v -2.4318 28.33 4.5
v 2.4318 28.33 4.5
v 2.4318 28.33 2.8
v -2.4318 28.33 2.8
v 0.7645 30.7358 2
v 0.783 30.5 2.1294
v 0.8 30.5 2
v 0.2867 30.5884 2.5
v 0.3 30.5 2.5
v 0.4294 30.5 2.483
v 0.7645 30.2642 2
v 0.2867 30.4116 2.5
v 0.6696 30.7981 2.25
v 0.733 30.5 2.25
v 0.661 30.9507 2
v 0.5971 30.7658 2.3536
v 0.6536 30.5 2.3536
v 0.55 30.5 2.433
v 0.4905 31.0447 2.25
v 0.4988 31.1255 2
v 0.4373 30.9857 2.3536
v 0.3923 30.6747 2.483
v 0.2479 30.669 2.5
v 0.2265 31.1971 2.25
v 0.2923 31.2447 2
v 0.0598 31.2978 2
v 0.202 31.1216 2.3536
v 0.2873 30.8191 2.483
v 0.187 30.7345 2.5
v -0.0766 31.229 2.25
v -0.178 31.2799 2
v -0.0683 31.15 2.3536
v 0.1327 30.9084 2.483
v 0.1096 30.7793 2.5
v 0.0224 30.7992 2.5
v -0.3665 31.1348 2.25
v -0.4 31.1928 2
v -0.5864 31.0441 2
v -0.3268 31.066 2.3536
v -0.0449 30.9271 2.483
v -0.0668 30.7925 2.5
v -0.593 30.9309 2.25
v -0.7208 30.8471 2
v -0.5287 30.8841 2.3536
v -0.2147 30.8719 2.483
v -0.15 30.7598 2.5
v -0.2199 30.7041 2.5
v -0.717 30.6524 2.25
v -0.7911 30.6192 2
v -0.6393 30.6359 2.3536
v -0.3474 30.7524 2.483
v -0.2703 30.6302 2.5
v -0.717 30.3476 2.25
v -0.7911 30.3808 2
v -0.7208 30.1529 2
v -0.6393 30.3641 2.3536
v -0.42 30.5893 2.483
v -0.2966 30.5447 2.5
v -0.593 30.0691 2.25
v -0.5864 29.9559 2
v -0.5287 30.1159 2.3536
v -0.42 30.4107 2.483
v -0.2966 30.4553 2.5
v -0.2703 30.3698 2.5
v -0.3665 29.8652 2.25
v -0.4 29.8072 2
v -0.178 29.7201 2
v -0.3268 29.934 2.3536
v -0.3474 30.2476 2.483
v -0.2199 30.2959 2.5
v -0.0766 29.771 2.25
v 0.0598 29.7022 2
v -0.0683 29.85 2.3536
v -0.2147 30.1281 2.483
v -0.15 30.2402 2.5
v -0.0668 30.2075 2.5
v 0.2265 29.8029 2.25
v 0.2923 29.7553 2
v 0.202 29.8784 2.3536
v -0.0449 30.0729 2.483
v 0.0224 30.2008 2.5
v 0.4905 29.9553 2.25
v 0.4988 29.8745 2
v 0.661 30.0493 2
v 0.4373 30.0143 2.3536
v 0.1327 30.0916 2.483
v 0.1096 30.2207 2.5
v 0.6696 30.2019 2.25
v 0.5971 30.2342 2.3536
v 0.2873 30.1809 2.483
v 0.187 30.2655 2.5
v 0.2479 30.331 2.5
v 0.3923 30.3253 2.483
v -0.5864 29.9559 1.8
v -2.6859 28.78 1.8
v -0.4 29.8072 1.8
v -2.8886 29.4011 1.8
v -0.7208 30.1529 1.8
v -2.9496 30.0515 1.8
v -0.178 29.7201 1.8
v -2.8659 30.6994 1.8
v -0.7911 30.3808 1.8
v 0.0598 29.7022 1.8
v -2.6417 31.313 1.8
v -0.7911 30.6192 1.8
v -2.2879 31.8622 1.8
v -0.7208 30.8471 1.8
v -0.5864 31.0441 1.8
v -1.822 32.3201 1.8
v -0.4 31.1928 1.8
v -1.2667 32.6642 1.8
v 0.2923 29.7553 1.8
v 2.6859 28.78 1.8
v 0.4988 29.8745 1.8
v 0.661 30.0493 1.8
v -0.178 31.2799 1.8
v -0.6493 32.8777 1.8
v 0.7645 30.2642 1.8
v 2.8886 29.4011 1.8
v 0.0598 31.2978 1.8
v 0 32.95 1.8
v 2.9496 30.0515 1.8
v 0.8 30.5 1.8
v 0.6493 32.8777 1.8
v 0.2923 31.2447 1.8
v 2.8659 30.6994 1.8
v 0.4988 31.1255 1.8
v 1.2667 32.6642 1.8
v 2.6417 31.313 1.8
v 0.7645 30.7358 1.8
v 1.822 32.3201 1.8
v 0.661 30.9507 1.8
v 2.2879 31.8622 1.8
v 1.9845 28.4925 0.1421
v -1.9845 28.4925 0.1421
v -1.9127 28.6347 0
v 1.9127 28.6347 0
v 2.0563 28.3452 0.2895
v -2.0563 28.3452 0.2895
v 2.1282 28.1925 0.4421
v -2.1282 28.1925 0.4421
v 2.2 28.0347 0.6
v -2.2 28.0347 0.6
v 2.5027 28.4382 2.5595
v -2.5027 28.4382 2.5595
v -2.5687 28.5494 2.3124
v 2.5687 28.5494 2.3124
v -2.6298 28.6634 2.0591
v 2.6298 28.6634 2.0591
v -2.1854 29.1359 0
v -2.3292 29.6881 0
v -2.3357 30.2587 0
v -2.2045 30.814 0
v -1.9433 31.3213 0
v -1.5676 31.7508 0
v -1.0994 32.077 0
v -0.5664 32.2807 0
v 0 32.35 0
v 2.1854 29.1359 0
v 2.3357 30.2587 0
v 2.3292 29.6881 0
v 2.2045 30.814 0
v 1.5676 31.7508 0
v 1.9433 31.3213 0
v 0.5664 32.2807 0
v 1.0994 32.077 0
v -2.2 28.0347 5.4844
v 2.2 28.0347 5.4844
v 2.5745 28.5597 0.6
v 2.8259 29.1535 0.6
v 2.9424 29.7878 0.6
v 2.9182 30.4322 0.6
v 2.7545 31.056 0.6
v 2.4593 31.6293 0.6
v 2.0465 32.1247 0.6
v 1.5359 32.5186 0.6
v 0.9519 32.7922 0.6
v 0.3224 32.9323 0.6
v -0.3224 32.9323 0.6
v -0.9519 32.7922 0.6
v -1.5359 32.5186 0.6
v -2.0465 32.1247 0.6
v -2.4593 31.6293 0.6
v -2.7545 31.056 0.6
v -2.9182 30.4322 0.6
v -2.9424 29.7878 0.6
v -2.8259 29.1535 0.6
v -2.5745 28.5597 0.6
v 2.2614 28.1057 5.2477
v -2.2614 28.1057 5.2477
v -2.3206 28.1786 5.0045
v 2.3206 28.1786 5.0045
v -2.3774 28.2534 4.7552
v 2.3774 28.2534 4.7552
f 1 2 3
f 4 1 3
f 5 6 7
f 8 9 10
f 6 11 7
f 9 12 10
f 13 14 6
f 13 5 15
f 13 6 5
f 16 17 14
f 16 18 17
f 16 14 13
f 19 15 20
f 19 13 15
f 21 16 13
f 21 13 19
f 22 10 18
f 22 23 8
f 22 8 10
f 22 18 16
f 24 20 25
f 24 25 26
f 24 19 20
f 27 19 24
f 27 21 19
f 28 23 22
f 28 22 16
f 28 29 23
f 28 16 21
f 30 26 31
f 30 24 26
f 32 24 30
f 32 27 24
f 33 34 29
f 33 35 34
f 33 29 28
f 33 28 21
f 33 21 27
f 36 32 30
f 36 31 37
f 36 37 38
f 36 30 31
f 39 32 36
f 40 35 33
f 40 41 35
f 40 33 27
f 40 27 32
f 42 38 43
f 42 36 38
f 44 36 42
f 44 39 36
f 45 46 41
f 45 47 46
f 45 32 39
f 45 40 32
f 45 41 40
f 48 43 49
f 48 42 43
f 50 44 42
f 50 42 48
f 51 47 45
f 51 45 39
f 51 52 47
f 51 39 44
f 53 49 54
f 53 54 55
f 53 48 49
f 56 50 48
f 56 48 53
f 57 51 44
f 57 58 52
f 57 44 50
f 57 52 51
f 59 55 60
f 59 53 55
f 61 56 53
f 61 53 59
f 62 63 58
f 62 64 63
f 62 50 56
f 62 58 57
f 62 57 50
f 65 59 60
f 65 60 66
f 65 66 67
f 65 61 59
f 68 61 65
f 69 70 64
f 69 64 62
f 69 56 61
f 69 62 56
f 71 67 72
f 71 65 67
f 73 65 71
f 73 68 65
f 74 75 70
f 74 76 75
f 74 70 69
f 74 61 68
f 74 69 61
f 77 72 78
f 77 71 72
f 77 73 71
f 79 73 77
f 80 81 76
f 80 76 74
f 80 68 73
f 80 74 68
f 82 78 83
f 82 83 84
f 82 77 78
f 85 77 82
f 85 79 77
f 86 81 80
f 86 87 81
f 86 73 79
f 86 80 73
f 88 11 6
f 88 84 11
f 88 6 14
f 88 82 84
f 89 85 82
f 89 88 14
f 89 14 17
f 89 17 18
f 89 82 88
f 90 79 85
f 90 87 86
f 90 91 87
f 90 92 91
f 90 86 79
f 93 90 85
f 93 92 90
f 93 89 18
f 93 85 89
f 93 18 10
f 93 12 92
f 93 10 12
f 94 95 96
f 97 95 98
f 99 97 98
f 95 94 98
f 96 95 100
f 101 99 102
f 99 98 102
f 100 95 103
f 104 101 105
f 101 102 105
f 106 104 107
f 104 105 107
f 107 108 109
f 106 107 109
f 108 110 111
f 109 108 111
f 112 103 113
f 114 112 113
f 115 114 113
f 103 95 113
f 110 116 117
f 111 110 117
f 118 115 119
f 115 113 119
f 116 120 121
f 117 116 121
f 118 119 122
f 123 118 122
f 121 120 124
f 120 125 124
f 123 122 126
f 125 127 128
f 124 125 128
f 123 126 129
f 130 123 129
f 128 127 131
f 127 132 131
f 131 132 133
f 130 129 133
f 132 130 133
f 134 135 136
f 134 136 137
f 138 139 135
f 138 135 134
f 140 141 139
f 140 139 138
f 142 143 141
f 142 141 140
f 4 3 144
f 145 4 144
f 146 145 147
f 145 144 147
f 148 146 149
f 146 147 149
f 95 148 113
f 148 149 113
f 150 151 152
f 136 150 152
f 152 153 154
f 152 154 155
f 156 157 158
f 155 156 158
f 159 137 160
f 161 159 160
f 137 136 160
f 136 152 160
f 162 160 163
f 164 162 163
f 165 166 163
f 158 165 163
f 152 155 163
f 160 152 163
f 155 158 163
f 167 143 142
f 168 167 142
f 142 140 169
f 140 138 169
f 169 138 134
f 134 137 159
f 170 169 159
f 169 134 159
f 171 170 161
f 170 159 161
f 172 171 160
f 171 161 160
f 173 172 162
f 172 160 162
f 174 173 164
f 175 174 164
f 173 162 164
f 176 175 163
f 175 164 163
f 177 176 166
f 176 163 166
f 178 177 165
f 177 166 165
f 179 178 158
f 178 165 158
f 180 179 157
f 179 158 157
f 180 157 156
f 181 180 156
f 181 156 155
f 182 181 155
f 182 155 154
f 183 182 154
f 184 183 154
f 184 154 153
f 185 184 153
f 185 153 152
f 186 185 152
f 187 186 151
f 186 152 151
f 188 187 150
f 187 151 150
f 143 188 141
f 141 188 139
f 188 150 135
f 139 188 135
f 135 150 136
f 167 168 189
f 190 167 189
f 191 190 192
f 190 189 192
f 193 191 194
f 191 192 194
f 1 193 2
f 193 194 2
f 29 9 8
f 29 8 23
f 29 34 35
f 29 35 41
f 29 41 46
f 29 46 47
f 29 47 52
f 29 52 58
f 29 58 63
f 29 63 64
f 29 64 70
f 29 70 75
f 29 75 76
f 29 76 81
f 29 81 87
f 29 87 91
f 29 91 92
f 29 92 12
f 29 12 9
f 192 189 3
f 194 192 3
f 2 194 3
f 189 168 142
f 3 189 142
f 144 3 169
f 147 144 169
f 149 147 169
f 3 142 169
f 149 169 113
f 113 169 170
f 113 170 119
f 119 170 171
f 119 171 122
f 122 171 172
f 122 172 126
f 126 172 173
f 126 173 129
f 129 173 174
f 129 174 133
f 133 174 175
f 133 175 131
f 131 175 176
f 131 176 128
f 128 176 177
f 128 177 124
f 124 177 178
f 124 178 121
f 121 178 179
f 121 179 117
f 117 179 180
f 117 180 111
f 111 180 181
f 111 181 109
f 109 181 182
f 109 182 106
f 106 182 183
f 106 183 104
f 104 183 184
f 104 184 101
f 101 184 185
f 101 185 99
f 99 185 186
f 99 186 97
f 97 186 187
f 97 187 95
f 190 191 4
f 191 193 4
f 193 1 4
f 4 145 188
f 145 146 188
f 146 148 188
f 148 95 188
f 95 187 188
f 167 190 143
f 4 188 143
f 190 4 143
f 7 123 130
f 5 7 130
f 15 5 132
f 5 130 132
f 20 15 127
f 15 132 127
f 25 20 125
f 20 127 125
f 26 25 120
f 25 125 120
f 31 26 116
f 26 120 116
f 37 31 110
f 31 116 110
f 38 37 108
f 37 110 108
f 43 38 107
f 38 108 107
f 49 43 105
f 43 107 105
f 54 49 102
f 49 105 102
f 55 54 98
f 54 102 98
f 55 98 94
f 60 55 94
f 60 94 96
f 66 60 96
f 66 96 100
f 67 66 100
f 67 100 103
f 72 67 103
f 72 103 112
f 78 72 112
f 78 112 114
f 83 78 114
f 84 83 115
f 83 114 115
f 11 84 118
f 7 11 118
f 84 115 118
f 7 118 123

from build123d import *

# Parameters (mm, degrees)
PAD003_DEPTH         = 5.5
POCKET004_DEPTH      = 2.951
POCKET004_DEPTH_BACK = 2.951
SKETCH013_R          = 0.8
PAD006_DEPTH         = 0.7
FILLET_R             = 0.5
CHAMFER004_SIZE      = 0.6


with BuildPart() as part:
    # Sketch004 → Pad003 (new body)
    with BuildSketch(Plane.XY):
        with BuildLine():
            ThreePointArc((2.2, -1.9653244007), (0, 2.95), (-2.2, -1.9653244007))
            Line((-2.2, -1.9653244007), (2.2, -1.9653244007))
        make_face()
    extrude(amount=PAD003_DEPTH)

    # Sketch014 → Pocket004 (cut, two sides)
    with BuildSketch(Plane.YZ) as pocket004_sk:
        Polygon((-1.97, 5.5), (-1.67, 4.5), (-1.67, 2.8), (-1.22, 1.8), (4, 1.8), (4, 5.5), align=None)
    extrude(amount=-POCKET004_DEPTH, mode=Mode.SUBTRACT)
    extrude(pocket004_sk.sketch, amount=POCKET004_DEPTH_BACK, mode=Mode.SUBTRACT)

    # Sketch013 (on Face7 of Pocket004) → Pad006 (join)
    with BuildSketch(Plane.XY.offset(1.8)):
        with Locations((0, 0.5)):
            Circle(SKETCH013_R)
    extrude(amount=PAD006_DEPTH)

    # Fillet
    fillet_edges = [part.edges().sort_by_distance(p)[0] for p in [
        (-0.8, 0.5, 2.5),
    ]]
    fillet(fillet_edges, radius=FILLET_R)

    # Chamfer004
    chamfer004_edges = [part.edges().sort_by_distance(p)[0] for p in [
        (0, 2.95, 0),
        (0, -1.965324, 0),
    ]]
    chamfer(chamfer004_edges, length=CHAMFER004_SIZE)


with BuildPart() as part_1:
    # Body024 placement: moved
    add(part.part.moved(Location((0, 30, 0))))


solid = part_1.part
